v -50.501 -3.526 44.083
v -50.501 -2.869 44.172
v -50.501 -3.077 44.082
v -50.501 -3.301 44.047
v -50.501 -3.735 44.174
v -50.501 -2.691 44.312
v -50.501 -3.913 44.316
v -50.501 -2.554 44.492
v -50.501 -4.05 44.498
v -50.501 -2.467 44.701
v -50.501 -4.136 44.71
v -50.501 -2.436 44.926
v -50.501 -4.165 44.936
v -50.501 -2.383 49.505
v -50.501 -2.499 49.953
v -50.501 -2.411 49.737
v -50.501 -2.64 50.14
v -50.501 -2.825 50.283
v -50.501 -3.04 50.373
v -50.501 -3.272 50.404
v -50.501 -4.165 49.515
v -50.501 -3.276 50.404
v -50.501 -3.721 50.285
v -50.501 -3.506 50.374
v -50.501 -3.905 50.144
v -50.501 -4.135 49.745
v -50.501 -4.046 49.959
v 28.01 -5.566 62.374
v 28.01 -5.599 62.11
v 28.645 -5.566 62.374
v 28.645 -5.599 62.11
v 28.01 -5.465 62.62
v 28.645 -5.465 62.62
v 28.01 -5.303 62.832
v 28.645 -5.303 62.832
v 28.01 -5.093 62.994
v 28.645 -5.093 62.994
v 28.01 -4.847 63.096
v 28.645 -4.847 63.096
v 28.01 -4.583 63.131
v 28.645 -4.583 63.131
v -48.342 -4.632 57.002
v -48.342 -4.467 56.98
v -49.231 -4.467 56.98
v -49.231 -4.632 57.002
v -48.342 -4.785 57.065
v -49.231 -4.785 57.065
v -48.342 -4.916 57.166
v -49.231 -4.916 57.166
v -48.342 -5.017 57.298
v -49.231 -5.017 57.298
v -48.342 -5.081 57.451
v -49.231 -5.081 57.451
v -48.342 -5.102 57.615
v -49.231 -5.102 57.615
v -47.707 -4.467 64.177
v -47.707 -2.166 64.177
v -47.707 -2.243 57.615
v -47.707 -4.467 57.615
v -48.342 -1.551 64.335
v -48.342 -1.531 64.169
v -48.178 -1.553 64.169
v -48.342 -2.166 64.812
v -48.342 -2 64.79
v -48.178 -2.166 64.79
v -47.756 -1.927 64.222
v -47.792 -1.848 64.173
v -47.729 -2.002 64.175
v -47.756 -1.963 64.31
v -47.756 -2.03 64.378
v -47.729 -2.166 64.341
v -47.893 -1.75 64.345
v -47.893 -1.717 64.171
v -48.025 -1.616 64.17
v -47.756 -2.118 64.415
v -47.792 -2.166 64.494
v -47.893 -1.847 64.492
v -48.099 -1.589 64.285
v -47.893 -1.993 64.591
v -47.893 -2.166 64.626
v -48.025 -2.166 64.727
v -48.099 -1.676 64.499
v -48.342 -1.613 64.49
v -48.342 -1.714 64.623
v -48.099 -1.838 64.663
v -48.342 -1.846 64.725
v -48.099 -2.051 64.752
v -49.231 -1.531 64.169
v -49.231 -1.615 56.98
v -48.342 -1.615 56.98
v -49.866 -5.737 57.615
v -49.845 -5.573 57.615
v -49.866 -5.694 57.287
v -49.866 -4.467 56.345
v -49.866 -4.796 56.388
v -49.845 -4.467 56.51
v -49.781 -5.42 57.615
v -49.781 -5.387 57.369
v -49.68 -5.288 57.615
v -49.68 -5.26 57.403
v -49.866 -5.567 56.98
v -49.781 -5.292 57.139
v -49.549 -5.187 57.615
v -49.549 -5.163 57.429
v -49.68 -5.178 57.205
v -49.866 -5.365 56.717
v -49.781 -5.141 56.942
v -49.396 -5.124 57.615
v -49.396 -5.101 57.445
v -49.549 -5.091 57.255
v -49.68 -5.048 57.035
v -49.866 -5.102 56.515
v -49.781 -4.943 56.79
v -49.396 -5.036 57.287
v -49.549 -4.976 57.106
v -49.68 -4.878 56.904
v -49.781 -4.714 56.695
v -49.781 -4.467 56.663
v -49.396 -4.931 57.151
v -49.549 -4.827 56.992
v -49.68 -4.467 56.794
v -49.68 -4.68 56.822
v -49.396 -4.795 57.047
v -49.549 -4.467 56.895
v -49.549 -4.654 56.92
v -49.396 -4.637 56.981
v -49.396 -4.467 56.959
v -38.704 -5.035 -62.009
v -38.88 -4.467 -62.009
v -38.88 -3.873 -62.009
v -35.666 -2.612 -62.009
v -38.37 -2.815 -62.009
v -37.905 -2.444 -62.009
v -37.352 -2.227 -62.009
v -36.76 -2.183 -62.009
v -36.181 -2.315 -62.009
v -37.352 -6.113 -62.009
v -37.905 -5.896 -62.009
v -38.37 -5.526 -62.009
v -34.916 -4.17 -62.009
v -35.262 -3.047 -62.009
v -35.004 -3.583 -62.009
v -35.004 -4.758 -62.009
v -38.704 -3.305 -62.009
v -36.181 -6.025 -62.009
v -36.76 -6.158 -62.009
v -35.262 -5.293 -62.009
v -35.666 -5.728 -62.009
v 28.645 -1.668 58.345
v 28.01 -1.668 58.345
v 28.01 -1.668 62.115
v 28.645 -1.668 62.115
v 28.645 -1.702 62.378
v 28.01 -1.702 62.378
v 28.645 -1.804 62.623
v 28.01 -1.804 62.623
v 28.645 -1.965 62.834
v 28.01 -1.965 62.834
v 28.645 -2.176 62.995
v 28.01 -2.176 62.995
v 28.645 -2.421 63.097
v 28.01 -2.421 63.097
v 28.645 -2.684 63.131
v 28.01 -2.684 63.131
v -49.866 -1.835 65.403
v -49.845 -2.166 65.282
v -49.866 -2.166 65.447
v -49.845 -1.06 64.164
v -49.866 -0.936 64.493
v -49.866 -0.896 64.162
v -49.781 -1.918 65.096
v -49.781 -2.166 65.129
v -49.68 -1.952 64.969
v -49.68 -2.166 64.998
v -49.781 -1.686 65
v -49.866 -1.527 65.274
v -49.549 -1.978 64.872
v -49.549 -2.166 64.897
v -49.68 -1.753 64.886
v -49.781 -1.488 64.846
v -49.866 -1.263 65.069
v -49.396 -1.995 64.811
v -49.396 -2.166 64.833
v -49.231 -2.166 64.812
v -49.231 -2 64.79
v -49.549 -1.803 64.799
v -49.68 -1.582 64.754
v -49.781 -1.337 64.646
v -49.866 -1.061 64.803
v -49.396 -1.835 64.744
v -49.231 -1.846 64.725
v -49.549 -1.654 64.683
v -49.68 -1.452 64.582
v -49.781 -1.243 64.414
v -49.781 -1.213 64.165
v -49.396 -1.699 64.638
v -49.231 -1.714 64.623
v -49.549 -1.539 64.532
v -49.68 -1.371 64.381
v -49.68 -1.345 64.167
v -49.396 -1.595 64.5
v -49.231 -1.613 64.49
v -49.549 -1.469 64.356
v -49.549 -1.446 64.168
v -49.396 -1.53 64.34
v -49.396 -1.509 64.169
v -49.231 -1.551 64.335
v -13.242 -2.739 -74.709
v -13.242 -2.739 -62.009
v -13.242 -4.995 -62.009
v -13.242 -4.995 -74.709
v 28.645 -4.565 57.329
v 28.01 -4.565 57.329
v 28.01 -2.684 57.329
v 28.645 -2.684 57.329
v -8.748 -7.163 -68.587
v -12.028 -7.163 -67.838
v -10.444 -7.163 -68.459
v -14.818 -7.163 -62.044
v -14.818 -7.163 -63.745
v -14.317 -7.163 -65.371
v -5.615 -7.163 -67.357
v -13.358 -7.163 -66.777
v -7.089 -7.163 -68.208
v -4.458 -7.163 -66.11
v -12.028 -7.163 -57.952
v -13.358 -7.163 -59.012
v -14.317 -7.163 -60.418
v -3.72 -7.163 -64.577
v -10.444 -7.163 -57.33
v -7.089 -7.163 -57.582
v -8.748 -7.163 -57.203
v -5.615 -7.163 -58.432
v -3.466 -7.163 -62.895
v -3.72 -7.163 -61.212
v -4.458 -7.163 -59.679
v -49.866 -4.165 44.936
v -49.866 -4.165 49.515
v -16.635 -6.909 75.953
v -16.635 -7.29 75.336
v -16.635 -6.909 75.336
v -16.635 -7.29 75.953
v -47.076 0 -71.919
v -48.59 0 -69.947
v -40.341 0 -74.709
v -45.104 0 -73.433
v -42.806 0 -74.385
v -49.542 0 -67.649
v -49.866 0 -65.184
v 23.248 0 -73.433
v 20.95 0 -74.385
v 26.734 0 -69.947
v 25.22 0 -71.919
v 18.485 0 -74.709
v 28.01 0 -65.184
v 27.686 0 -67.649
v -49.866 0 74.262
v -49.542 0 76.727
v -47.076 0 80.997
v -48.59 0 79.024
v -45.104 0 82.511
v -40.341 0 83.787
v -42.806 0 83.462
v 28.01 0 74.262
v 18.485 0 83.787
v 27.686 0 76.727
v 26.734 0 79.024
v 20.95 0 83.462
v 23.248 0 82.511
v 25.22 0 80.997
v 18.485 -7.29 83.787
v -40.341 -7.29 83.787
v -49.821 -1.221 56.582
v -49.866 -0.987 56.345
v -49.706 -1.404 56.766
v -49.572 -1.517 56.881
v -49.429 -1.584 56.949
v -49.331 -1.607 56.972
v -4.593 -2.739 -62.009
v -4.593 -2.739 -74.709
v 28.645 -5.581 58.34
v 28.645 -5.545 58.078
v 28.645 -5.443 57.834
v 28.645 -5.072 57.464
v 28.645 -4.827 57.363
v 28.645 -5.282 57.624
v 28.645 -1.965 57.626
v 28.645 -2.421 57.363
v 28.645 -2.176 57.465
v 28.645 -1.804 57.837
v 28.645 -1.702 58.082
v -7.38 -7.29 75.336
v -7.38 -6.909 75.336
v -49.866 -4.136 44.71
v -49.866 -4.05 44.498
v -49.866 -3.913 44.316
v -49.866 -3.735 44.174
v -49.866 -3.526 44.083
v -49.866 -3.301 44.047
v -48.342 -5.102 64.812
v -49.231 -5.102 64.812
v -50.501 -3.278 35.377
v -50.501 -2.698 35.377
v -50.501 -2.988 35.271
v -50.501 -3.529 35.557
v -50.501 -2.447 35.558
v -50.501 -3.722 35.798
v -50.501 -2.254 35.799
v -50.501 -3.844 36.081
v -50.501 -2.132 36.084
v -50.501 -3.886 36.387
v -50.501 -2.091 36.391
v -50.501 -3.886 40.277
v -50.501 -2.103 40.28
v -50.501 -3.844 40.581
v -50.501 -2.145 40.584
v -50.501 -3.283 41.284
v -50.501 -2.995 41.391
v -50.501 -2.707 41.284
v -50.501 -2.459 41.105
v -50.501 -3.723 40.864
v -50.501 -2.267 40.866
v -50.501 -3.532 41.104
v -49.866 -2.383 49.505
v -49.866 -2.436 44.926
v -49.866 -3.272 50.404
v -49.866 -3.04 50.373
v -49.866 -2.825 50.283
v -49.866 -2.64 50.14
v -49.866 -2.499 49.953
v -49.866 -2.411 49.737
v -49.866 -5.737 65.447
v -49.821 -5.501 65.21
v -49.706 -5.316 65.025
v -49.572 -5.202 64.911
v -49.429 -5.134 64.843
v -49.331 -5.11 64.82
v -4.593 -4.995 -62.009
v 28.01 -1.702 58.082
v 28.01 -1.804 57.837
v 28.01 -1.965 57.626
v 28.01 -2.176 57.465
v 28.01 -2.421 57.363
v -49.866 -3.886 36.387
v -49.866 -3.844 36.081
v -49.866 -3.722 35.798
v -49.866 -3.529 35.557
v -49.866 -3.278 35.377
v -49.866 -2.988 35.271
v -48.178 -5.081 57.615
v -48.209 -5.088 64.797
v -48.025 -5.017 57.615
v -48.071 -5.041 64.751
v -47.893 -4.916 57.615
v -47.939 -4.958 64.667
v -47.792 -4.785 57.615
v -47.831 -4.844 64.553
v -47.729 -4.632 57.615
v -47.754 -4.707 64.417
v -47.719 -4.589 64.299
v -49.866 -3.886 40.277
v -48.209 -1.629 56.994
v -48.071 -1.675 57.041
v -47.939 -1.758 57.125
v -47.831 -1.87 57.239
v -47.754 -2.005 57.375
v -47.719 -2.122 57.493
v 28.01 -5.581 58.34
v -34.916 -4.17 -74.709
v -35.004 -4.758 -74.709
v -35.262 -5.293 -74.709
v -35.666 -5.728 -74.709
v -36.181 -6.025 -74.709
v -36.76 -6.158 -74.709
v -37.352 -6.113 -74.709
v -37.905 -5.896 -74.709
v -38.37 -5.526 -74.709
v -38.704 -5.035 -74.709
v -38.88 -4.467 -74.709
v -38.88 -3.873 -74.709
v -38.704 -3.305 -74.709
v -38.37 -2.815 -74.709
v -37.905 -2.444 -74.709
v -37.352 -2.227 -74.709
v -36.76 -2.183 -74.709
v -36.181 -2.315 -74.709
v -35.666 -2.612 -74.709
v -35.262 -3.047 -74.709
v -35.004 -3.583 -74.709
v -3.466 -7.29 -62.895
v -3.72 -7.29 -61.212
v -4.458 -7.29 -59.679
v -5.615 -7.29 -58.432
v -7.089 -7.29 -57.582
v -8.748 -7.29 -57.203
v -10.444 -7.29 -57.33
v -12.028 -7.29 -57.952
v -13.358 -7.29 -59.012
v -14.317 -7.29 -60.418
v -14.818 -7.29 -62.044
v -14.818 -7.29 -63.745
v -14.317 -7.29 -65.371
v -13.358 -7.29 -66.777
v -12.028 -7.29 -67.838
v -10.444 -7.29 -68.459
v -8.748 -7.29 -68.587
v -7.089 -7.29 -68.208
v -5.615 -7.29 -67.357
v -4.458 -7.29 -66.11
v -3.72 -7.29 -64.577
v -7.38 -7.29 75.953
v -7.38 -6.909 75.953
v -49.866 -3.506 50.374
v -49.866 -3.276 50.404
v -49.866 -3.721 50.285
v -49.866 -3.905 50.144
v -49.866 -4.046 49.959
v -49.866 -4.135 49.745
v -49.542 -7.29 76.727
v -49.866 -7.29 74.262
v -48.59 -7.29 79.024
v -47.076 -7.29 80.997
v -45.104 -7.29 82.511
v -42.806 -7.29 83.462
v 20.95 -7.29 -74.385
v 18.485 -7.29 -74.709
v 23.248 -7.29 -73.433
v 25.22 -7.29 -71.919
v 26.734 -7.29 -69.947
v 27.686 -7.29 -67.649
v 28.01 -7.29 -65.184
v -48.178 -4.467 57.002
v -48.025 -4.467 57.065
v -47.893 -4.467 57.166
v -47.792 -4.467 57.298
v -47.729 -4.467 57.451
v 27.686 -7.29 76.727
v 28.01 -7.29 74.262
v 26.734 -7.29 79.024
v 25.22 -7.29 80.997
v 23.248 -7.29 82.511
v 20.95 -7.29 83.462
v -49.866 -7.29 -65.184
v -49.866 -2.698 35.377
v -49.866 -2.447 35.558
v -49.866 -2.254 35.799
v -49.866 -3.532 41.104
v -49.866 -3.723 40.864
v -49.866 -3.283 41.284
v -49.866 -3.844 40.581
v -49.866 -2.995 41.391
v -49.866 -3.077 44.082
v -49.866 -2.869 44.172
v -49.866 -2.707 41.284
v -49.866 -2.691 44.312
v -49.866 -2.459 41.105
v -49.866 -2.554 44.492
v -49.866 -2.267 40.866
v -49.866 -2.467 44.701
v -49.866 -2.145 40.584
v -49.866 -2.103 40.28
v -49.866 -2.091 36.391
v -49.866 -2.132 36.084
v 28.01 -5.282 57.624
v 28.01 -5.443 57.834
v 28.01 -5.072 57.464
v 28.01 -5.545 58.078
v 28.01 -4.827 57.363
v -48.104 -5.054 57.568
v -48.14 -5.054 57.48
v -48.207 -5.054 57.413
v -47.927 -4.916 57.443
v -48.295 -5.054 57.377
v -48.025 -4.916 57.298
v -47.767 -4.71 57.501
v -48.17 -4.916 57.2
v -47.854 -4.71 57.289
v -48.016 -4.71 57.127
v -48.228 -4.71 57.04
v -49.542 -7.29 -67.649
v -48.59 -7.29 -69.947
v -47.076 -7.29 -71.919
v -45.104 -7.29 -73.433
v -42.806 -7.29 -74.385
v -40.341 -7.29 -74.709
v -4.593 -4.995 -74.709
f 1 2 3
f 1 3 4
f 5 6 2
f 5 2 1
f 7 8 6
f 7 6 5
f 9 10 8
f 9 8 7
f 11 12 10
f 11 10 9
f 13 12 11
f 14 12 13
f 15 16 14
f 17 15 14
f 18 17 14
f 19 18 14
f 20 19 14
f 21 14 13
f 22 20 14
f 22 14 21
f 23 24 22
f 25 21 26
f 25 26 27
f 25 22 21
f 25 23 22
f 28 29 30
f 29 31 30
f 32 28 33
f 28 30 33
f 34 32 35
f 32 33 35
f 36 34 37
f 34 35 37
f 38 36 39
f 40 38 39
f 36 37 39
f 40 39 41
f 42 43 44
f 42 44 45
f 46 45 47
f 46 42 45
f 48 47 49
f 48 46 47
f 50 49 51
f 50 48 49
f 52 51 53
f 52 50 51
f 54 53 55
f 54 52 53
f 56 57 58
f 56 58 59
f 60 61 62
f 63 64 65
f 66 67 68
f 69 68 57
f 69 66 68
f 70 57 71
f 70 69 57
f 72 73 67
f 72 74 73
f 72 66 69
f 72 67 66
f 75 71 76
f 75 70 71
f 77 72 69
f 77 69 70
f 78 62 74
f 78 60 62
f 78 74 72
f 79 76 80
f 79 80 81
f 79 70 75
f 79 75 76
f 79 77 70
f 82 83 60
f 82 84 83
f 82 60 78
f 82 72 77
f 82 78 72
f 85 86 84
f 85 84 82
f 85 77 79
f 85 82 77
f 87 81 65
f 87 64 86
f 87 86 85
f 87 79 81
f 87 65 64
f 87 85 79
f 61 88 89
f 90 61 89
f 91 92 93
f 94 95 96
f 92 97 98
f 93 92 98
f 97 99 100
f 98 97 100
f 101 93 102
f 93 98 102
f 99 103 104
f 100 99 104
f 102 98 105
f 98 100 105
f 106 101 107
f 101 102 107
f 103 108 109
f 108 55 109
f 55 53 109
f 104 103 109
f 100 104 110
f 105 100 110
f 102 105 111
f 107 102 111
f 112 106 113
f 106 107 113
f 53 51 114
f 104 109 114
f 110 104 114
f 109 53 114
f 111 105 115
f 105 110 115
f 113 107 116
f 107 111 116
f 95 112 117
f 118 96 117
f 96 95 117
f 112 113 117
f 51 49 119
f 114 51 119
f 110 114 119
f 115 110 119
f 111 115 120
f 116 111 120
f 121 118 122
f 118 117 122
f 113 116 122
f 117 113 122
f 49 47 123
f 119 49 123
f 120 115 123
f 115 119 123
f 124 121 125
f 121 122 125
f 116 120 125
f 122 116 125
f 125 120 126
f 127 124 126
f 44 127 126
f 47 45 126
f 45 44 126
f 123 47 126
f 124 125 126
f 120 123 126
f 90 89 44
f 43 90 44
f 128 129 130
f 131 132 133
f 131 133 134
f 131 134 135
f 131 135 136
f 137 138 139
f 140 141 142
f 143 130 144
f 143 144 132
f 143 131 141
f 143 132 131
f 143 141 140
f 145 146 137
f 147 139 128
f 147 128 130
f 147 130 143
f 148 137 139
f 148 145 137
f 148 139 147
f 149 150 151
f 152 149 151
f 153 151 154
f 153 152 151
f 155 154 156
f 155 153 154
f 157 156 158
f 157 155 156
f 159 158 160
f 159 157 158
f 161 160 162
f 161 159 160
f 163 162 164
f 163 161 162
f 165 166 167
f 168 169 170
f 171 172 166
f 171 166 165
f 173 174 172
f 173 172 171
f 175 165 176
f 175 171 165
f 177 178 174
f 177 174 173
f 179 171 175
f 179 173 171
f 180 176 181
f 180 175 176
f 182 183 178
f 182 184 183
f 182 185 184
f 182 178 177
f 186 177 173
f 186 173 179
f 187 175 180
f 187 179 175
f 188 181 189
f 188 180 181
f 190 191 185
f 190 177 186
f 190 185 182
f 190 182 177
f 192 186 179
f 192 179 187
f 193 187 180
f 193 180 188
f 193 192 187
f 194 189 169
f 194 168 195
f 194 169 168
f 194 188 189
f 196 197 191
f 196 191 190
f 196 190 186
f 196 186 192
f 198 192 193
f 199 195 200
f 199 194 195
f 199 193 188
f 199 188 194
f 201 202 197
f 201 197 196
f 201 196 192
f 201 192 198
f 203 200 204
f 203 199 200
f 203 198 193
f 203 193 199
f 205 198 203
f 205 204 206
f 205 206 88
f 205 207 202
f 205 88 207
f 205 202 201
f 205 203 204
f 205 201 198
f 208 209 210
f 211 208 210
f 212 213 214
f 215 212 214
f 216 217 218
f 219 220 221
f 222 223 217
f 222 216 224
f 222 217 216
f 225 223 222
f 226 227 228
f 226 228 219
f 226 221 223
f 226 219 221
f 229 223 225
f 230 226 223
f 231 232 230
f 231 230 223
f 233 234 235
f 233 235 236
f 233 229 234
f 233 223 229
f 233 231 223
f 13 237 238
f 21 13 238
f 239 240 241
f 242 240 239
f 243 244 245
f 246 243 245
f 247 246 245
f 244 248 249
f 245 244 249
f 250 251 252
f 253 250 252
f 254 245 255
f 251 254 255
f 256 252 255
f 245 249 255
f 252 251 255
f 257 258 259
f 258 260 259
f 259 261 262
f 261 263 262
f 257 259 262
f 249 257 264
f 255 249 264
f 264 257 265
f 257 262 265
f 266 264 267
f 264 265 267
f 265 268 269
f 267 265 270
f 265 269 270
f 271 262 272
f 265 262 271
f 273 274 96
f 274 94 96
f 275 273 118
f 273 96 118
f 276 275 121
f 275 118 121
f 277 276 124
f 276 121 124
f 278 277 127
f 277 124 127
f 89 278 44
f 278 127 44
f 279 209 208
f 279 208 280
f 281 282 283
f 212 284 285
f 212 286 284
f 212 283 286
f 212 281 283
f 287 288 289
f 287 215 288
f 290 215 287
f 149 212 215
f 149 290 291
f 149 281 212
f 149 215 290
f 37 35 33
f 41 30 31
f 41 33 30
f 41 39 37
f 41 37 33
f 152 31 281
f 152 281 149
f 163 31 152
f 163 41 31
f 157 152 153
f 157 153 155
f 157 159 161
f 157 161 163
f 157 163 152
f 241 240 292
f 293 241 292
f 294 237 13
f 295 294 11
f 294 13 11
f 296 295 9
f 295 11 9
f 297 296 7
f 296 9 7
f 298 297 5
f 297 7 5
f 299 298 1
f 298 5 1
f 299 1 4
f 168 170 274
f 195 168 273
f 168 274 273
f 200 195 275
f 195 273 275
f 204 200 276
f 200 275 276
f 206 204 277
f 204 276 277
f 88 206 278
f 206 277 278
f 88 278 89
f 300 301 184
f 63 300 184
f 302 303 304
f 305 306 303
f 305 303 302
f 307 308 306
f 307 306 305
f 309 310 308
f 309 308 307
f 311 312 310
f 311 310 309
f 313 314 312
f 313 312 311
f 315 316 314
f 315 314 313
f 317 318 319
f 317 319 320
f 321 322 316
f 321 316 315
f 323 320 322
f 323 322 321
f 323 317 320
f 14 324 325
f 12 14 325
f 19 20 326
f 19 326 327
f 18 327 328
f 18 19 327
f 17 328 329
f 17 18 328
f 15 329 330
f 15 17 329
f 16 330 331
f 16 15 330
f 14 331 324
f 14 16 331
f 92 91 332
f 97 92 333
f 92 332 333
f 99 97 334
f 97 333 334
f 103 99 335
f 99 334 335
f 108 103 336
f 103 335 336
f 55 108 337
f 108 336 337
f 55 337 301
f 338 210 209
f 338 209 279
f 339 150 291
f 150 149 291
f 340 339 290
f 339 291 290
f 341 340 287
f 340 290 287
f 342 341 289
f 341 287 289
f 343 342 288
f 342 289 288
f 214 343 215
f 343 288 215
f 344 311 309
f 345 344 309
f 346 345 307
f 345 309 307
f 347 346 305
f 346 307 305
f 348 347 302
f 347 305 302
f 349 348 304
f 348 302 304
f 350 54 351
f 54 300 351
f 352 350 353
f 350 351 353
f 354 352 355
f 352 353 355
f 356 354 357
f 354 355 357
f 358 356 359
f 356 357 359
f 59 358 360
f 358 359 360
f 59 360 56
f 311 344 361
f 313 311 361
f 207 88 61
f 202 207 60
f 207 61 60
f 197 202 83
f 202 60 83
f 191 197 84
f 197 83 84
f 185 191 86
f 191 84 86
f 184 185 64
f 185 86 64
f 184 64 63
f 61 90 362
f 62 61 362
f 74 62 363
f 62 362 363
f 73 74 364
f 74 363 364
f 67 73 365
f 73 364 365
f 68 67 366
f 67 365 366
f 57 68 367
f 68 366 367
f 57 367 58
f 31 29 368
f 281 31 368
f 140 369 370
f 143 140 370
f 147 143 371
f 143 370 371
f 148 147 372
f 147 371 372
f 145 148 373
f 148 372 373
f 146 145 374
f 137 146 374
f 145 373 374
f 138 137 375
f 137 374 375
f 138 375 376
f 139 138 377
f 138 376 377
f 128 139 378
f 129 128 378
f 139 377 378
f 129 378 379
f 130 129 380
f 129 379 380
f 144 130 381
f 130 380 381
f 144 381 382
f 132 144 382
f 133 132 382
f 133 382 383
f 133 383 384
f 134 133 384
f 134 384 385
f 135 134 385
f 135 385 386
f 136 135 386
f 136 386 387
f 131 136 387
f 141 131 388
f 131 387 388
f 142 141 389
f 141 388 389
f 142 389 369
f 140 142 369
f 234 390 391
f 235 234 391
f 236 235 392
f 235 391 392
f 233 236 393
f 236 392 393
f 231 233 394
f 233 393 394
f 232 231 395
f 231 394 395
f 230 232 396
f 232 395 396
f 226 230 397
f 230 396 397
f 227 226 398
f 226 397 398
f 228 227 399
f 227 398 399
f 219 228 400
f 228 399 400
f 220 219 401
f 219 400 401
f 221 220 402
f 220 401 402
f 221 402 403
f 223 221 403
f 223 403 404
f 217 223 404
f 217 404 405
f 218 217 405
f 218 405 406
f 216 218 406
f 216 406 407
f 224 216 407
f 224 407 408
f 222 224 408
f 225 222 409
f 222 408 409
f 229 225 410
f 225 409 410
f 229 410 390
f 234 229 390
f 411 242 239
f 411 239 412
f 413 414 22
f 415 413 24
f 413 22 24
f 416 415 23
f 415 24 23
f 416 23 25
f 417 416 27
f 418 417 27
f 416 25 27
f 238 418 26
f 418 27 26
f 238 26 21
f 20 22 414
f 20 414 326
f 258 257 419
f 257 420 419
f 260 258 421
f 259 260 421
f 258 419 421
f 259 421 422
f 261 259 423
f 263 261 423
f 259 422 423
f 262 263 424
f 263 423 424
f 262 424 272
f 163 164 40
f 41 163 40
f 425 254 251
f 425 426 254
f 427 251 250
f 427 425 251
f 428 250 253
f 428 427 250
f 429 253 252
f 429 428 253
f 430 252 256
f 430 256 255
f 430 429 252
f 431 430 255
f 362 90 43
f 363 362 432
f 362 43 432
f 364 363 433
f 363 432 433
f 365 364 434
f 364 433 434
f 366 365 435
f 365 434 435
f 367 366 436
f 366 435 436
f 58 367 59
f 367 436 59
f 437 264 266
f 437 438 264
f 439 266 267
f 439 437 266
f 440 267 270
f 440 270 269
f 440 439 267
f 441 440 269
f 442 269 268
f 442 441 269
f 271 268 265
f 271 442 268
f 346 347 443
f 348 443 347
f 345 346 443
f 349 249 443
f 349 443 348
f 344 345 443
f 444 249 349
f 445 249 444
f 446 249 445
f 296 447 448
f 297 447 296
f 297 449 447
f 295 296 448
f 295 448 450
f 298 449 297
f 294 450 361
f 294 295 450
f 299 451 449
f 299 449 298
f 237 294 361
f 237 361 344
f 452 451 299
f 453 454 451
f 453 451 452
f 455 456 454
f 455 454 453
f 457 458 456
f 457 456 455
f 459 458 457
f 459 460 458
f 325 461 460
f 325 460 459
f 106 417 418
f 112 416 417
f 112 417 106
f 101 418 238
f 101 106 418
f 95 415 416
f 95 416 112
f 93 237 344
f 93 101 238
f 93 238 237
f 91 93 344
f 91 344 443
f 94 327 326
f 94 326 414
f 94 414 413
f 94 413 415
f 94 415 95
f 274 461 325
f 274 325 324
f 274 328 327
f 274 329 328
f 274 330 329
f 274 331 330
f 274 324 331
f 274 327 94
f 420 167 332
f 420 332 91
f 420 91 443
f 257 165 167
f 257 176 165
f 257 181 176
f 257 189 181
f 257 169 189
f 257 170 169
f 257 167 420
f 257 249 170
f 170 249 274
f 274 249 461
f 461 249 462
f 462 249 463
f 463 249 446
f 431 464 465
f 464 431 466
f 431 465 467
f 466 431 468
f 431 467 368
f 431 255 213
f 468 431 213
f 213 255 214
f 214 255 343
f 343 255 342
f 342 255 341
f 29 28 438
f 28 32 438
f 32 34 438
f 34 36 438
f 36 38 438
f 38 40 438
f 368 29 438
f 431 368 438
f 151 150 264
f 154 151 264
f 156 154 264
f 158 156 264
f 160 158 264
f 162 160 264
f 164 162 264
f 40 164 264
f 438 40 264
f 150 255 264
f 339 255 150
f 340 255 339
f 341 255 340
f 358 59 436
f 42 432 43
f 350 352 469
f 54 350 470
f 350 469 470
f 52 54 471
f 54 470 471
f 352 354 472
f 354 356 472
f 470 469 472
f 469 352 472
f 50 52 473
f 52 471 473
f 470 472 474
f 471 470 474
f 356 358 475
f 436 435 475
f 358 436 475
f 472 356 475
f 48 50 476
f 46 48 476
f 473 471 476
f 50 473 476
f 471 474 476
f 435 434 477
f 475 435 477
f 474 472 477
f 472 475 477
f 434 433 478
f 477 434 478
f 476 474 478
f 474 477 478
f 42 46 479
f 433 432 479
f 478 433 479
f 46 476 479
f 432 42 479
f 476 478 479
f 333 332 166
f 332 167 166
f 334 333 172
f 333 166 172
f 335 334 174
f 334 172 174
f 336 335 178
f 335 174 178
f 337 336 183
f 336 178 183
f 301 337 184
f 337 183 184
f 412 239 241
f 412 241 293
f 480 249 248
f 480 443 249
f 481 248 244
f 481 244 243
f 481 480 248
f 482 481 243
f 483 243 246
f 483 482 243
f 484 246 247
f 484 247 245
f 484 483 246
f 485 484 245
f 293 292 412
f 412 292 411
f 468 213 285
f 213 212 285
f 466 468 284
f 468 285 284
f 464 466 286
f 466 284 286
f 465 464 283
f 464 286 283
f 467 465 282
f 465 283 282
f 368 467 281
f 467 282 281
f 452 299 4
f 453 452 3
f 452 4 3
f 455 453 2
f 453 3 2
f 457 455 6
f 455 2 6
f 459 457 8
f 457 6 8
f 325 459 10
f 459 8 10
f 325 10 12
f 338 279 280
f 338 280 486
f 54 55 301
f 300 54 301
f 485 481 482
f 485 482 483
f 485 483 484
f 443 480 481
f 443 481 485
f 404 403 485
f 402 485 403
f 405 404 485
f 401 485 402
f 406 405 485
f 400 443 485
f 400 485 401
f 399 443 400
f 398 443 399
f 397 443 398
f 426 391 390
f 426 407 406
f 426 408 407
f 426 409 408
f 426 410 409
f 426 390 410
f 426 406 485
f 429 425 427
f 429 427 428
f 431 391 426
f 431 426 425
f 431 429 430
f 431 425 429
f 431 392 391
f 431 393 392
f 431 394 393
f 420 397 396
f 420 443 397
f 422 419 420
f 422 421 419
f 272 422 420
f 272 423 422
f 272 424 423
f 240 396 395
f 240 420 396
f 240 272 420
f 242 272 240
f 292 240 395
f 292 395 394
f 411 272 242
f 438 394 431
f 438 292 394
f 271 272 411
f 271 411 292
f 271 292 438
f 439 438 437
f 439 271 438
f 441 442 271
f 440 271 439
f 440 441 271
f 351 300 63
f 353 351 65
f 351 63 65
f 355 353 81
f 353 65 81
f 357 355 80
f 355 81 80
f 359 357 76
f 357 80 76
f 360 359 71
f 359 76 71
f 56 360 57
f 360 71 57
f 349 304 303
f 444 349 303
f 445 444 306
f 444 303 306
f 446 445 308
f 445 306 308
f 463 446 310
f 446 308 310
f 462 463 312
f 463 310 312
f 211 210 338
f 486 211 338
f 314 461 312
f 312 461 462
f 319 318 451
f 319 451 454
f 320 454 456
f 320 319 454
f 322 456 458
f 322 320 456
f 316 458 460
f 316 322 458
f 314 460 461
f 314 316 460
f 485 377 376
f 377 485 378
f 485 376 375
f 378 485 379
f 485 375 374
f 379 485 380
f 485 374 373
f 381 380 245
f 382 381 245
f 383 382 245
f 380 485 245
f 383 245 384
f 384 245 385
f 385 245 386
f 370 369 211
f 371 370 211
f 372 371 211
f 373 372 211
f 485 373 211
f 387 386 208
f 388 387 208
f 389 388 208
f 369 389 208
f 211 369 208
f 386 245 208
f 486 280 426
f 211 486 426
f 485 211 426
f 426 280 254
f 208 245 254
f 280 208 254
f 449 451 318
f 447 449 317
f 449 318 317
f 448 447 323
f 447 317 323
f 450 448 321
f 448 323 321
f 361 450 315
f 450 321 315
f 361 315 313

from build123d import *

# Parameters (mm, degrees)
F0_W         = 77.8764
F0_H         = 158.496
F1_DEPTH     = 7.2898
F2_R         = 9.525
F3_R         = 5.7077755574
F4_DEPTH     = 0.127
F5_W         = 9.2544863001
F5_H         = 0.6169676781
F6_DEPTH     = 0.381
F8_DEPTH     = 0.635
F9_R         = 1.016
F10_R        = 1.9930126565
F11_DEPTH    = 12.7
F13_W        = 8.6497310549
F13_H        = 2.2564521059
F14_DEPTH    = 12.7
F16_DEPTH    = 2.159
F18_DEPTH    = 0.635
F19_T1_DEPTH = 2.8833260431
F19_T3_DEPTH = 2.8575
F19_T5_DEPTH = 2.8319706152
F21_DEPTH    = 0.635
F22_T1_DEPTH = 3.4834715988
F22_T3_DEPTH = 3.4925
F22_T5_DEPTH = 3.5015570173
F23_R        = 0.635


# Not quite as in the source:
# - a fillet or chamfer that OpenCascade refuses, or shapes differently, is made with other operations: its cross-section is extruded or revolved along the edge and cut away or added


with BuildPart() as f1:
    # F0 (on Front) → F1 (new body)
    with BuildSketch(Plane.XZ):
        with Locations((-10.9280409528, 4.5388489962)):
            Rectangle(F0_W, F0_H)
    extrude(amount=F1_DEPTH)

    # F2
    f2_edges = [f1.edges().sort_by_distance(p)[0] for p in [
        (-49.866241, -3.6449, 83.786849),
        (28.010159, -3.6449, 83.786849),
        (28.010159, -3.6449, -74.709151),
        (-49.866241, -3.6449, -74.709151),
    ]]
    fillet(f2_edges, radius=F2_R)

    # F3 (on face) → F4 (cut)
    with BuildSketch(Plane.XZ.offset(7.2898)):
        with Locations((-9.174161778, -62.8947635373)):
            Circle(F3_R)
    extrude(amount=-F4_DEPTH, mode=Mode.SUBTRACT)

    # F5 (on face) → F6 (cut)
    with BuildSketch(Plane.XZ.offset(7.2898)):
        with Locations((-12.0077328756, 75.6440907717)):
            Rectangle(F5_W, F5_H)
    extrude(amount=-F6_DEPTH, mode=Mode.SUBTRACT)

    # F7 (on face) → F8 (join)
    with BuildSketch(Plane.YZ.offset(28.0101590472)):
        Polygon((-1.6678672982, 63.1312280893), (-5.6040398777, 63.1312280893), (-5.5761812255, 57.3286004364), (-1.6678672982, 57.3286004364), align=None)
    extrude(amount=F8_DEPTH)

    # F9
    f9_edges = [f1.edges().sort_by_distance(p)[0] for p in [
        (28.327659, -5.60404, 63.131228),
        (28.327659, -5.576181, 57.3286),
        (28.327659, -1.667867, 63.131228),
        (28.327659, -1.667867, 57.3286),
    ]]
    fillet(f9_edges, radius=F9_R)

    # F10 (on face) → F11 (cut)
    with BuildSketch(Plane(origin=(0, 0, -74.7091510038), x_dir=(1, 0, 0), z_dir=(0, 0, -1))):
        with Locations((-36.9087584466, 4.1701743638)):
            Circle(F10_R)
    extrude(amount=-F11_DEPTH, mode=Mode.SUBTRACT)

    # F13 (on face) → F14 (cut)
    with BuildSketch(Plane(origin=(0, 0, -74.7091510038), x_dir=(1, 0, 0), z_dir=(0, 0, -1))):
        with Locations((-8.9176273905, 3.8671875373)):
            Rectangle(F13_W, F13_H)
    extrude(amount=-F14_DEPTH, mode=Mode.SUBTRACT)

    # F15 (on face) → F16 (cut)
    with BuildSketch(Plane(origin=(-49.8662409528, 0, 0), x_dir=(0, -1, 0), z_dir=(-1, 0, 0))):
        Polygon((1.5233993763, 64.8115798831), (1.6149281291, 56.9802224636), (5.1021506079, 56.9802224636), (5.1021506079, 64.8115798831), align=None)
    extrude(amount=-F16_DEPTH, mode=Mode.SUBTRACT)

    # F17 (on face) → F18 (join)
    with BuildSketch(Plane(origin=(-49.8662409528, 0, 0), x_dir=(0, -1, 0), z_dir=(-1, 0, 0))):
        Polygon((2.3726914078, 50.4039227962), (2.4461376015, 44.0468862653), (4.1652750224, 44.0468862653), (4.1652750224, 50.4039227962), align=None)
    extrude(amount=F18_DEPTH)

    # F19: fillet of radius 0.889 on 4 edges, made by hand

    # F19_s2 → F19_t1 (cut)
    with BuildSketch(Plane.YZ.offset(-52.7495669959)):
        with BuildLine():
            ThreePointArc((-3.272021825, 50.4039227962), (-2.639783189, 50.1398990415), (-2.3830811527, 49.5046523961))
            Line((-2.3830811527, 49.5046523961), (-2.3726914078, 50.4039227962))
            Line((-2.3726914078, 50.4039227962), (-3.272021825, 50.4039227962))
        make_face()
    extrude(amount=F19_T1_DEPTH, mode=Mode.SUBTRACT)

    # F19_s4 → F19_t3 (cut)
    with BuildSketch(Plane.YZ.offset(-52.7237409528)):
        with BuildLine():
            ThreePointArc((-3.2762750224, 50.4039227962), (-3.9048929509, 50.1435407247), (-4.1652750224, 49.5149227962))
            Line((-4.1652750224, 49.5149227962), (-4.1652750224, 50.4039227962))
            Line((-4.1652750224, 50.4039227962), (-3.2762750224, 50.4039227962))
        make_face()
        with BuildLine():
            ThreePointArc((-4.1652750224, 44.9358862653), (-3.9048929509, 44.3072683368), (-3.2762750224, 44.0468862653))
            Line((-3.2762750224, 44.0468862653), (-4.1652750224, 44.0468862653))
            Line((-4.1652750224, 44.0468862653), (-4.1652750224, 44.9358862653))
        make_face()
    extrude(amount=F19_T3_DEPTH, mode=Mode.SUBTRACT)

    # F19_s6 → F19_t5 (cut)
    with BuildSketch(Plane.YZ.offset(-52.698211568)):
        with BuildLine():
            ThreePointArc((-3.3249258476, 44.0468862653), (-2.6999496023, 44.3036476293), (-2.4359851753, 44.9256158651))
            Line((-2.4359851753, 44.9256158651), (-2.4461376015, 44.0468862653))
            Line((-2.4461376015, 44.0468862653), (-3.3249258476, 44.0468862653))
        make_face()
    extrude(amount=F19_T5_DEPTH, mode=Mode.SUBTRACT)

    # F20 (on face) → F21 (join)
    with BuildSketch(Plane(origin=(-49.8662409528, 0, 0), x_dir=(0, -1, 0), z_dir=(-1, 0, 0))):
        Polygon((2.1069913637, 41.4195619524), (2.087448258, 35.2439321578), (3.8858172484, 35.2439321578), (3.8858172484, 41.4195619524), align=None)
    extrude(amount=F21_DEPTH)

    # F22: fillet of radius 1.143 on 4 edges, made by hand

    # F22_s2 → F22_t1 (cut)
    with BuildSketch(Plane.YZ.offset(-53.3497125516)):
        with BuildLine():
            ThreePointArc((-3.2463800032, 41.4195619524), (-2.4394367914, 41.0860628189), (-2.1033857264, 40.2801790179))
            Line((-2.1033857264, 40.2801790179), (-2.1069913637, 41.4195619524))
            Line((-2.1069913637, 41.4195619524), (-3.2463800032, 41.4195619524))
        make_face()
    extrude(amount=F22_T1_DEPTH, mode=Mode.SUBTRACT)

    # F22_s4 → F22_t3 (cut)
    with BuildSketch(Plane.YZ.offset(-53.3587409528)):
        with BuildLine():
            ThreePointArc((-2.7428172484, 41.4195619524), (-3.5510402993, 41.0847850032), (-3.8858172484, 40.2765619524))
            Line((-3.8858172484, 40.2765619524), (-3.8858172484, 41.4195619524))
            Line((-3.8858172484, 41.4195619524), (-2.7428172484, 41.4195619524))
        make_face()
        with BuildLine():
            ThreePointArc((-3.8858172484, 36.3869321578), (-3.5510402993, 35.5787091069), (-2.7428172484, 35.2439321578))
            Line((-2.7428172484, 35.2439321578), (-3.8858172484, 35.2439321578))
            Line((-3.8858172484, 35.2439321578), (-3.8858172484, 36.3869321578))
        make_face()
    extrude(amount=F22_T3_DEPTH, mode=Mode.SUBTRACT)

    # F22_s6 → F22_t5 (cut)
    with BuildSketch(Plane.YZ.offset(-53.3677979701)):
        with BuildLine():
            ThreePointArc((-3.2340710649, 35.2439321578), (-2.4245701983, 35.579988946), (-2.091076788, 36.3905492233))
            Line((-2.091076788, 36.3905492233), (-2.087448258, 35.2439321578))
            Line((-2.087448258, 35.2439321578), (-3.2340710649, 35.2439321578))
        make_face()
    extrude(amount=F22_T5_DEPTH, mode=Mode.SUBTRACT)

    # F23
    f23_edges = [f1.edges().sort_by_distance(p)[0] for p in [
        (-47.707241, -1.569164, 60.895901),
        (-47.707241, -3.358539, 56.980222),
        (-47.707241, -5.102151, 60.895901),
        (-47.707241, -3.312775, 64.81158),
        (-49.866241, -1.569164, 60.895901),
        (-48.786741, -5.102151, 56.980222),
        (-48.786741, -1.523399, 64.81158),
        (-49.866241, -5.102151, 60.895901),
        (-49.866241, -3.312775, 64.81158),
        (-49.866241, -3.358539, 56.980222),
    ]]
    fillet(f23_edges, radius=F23_R)


solid = f1.part
